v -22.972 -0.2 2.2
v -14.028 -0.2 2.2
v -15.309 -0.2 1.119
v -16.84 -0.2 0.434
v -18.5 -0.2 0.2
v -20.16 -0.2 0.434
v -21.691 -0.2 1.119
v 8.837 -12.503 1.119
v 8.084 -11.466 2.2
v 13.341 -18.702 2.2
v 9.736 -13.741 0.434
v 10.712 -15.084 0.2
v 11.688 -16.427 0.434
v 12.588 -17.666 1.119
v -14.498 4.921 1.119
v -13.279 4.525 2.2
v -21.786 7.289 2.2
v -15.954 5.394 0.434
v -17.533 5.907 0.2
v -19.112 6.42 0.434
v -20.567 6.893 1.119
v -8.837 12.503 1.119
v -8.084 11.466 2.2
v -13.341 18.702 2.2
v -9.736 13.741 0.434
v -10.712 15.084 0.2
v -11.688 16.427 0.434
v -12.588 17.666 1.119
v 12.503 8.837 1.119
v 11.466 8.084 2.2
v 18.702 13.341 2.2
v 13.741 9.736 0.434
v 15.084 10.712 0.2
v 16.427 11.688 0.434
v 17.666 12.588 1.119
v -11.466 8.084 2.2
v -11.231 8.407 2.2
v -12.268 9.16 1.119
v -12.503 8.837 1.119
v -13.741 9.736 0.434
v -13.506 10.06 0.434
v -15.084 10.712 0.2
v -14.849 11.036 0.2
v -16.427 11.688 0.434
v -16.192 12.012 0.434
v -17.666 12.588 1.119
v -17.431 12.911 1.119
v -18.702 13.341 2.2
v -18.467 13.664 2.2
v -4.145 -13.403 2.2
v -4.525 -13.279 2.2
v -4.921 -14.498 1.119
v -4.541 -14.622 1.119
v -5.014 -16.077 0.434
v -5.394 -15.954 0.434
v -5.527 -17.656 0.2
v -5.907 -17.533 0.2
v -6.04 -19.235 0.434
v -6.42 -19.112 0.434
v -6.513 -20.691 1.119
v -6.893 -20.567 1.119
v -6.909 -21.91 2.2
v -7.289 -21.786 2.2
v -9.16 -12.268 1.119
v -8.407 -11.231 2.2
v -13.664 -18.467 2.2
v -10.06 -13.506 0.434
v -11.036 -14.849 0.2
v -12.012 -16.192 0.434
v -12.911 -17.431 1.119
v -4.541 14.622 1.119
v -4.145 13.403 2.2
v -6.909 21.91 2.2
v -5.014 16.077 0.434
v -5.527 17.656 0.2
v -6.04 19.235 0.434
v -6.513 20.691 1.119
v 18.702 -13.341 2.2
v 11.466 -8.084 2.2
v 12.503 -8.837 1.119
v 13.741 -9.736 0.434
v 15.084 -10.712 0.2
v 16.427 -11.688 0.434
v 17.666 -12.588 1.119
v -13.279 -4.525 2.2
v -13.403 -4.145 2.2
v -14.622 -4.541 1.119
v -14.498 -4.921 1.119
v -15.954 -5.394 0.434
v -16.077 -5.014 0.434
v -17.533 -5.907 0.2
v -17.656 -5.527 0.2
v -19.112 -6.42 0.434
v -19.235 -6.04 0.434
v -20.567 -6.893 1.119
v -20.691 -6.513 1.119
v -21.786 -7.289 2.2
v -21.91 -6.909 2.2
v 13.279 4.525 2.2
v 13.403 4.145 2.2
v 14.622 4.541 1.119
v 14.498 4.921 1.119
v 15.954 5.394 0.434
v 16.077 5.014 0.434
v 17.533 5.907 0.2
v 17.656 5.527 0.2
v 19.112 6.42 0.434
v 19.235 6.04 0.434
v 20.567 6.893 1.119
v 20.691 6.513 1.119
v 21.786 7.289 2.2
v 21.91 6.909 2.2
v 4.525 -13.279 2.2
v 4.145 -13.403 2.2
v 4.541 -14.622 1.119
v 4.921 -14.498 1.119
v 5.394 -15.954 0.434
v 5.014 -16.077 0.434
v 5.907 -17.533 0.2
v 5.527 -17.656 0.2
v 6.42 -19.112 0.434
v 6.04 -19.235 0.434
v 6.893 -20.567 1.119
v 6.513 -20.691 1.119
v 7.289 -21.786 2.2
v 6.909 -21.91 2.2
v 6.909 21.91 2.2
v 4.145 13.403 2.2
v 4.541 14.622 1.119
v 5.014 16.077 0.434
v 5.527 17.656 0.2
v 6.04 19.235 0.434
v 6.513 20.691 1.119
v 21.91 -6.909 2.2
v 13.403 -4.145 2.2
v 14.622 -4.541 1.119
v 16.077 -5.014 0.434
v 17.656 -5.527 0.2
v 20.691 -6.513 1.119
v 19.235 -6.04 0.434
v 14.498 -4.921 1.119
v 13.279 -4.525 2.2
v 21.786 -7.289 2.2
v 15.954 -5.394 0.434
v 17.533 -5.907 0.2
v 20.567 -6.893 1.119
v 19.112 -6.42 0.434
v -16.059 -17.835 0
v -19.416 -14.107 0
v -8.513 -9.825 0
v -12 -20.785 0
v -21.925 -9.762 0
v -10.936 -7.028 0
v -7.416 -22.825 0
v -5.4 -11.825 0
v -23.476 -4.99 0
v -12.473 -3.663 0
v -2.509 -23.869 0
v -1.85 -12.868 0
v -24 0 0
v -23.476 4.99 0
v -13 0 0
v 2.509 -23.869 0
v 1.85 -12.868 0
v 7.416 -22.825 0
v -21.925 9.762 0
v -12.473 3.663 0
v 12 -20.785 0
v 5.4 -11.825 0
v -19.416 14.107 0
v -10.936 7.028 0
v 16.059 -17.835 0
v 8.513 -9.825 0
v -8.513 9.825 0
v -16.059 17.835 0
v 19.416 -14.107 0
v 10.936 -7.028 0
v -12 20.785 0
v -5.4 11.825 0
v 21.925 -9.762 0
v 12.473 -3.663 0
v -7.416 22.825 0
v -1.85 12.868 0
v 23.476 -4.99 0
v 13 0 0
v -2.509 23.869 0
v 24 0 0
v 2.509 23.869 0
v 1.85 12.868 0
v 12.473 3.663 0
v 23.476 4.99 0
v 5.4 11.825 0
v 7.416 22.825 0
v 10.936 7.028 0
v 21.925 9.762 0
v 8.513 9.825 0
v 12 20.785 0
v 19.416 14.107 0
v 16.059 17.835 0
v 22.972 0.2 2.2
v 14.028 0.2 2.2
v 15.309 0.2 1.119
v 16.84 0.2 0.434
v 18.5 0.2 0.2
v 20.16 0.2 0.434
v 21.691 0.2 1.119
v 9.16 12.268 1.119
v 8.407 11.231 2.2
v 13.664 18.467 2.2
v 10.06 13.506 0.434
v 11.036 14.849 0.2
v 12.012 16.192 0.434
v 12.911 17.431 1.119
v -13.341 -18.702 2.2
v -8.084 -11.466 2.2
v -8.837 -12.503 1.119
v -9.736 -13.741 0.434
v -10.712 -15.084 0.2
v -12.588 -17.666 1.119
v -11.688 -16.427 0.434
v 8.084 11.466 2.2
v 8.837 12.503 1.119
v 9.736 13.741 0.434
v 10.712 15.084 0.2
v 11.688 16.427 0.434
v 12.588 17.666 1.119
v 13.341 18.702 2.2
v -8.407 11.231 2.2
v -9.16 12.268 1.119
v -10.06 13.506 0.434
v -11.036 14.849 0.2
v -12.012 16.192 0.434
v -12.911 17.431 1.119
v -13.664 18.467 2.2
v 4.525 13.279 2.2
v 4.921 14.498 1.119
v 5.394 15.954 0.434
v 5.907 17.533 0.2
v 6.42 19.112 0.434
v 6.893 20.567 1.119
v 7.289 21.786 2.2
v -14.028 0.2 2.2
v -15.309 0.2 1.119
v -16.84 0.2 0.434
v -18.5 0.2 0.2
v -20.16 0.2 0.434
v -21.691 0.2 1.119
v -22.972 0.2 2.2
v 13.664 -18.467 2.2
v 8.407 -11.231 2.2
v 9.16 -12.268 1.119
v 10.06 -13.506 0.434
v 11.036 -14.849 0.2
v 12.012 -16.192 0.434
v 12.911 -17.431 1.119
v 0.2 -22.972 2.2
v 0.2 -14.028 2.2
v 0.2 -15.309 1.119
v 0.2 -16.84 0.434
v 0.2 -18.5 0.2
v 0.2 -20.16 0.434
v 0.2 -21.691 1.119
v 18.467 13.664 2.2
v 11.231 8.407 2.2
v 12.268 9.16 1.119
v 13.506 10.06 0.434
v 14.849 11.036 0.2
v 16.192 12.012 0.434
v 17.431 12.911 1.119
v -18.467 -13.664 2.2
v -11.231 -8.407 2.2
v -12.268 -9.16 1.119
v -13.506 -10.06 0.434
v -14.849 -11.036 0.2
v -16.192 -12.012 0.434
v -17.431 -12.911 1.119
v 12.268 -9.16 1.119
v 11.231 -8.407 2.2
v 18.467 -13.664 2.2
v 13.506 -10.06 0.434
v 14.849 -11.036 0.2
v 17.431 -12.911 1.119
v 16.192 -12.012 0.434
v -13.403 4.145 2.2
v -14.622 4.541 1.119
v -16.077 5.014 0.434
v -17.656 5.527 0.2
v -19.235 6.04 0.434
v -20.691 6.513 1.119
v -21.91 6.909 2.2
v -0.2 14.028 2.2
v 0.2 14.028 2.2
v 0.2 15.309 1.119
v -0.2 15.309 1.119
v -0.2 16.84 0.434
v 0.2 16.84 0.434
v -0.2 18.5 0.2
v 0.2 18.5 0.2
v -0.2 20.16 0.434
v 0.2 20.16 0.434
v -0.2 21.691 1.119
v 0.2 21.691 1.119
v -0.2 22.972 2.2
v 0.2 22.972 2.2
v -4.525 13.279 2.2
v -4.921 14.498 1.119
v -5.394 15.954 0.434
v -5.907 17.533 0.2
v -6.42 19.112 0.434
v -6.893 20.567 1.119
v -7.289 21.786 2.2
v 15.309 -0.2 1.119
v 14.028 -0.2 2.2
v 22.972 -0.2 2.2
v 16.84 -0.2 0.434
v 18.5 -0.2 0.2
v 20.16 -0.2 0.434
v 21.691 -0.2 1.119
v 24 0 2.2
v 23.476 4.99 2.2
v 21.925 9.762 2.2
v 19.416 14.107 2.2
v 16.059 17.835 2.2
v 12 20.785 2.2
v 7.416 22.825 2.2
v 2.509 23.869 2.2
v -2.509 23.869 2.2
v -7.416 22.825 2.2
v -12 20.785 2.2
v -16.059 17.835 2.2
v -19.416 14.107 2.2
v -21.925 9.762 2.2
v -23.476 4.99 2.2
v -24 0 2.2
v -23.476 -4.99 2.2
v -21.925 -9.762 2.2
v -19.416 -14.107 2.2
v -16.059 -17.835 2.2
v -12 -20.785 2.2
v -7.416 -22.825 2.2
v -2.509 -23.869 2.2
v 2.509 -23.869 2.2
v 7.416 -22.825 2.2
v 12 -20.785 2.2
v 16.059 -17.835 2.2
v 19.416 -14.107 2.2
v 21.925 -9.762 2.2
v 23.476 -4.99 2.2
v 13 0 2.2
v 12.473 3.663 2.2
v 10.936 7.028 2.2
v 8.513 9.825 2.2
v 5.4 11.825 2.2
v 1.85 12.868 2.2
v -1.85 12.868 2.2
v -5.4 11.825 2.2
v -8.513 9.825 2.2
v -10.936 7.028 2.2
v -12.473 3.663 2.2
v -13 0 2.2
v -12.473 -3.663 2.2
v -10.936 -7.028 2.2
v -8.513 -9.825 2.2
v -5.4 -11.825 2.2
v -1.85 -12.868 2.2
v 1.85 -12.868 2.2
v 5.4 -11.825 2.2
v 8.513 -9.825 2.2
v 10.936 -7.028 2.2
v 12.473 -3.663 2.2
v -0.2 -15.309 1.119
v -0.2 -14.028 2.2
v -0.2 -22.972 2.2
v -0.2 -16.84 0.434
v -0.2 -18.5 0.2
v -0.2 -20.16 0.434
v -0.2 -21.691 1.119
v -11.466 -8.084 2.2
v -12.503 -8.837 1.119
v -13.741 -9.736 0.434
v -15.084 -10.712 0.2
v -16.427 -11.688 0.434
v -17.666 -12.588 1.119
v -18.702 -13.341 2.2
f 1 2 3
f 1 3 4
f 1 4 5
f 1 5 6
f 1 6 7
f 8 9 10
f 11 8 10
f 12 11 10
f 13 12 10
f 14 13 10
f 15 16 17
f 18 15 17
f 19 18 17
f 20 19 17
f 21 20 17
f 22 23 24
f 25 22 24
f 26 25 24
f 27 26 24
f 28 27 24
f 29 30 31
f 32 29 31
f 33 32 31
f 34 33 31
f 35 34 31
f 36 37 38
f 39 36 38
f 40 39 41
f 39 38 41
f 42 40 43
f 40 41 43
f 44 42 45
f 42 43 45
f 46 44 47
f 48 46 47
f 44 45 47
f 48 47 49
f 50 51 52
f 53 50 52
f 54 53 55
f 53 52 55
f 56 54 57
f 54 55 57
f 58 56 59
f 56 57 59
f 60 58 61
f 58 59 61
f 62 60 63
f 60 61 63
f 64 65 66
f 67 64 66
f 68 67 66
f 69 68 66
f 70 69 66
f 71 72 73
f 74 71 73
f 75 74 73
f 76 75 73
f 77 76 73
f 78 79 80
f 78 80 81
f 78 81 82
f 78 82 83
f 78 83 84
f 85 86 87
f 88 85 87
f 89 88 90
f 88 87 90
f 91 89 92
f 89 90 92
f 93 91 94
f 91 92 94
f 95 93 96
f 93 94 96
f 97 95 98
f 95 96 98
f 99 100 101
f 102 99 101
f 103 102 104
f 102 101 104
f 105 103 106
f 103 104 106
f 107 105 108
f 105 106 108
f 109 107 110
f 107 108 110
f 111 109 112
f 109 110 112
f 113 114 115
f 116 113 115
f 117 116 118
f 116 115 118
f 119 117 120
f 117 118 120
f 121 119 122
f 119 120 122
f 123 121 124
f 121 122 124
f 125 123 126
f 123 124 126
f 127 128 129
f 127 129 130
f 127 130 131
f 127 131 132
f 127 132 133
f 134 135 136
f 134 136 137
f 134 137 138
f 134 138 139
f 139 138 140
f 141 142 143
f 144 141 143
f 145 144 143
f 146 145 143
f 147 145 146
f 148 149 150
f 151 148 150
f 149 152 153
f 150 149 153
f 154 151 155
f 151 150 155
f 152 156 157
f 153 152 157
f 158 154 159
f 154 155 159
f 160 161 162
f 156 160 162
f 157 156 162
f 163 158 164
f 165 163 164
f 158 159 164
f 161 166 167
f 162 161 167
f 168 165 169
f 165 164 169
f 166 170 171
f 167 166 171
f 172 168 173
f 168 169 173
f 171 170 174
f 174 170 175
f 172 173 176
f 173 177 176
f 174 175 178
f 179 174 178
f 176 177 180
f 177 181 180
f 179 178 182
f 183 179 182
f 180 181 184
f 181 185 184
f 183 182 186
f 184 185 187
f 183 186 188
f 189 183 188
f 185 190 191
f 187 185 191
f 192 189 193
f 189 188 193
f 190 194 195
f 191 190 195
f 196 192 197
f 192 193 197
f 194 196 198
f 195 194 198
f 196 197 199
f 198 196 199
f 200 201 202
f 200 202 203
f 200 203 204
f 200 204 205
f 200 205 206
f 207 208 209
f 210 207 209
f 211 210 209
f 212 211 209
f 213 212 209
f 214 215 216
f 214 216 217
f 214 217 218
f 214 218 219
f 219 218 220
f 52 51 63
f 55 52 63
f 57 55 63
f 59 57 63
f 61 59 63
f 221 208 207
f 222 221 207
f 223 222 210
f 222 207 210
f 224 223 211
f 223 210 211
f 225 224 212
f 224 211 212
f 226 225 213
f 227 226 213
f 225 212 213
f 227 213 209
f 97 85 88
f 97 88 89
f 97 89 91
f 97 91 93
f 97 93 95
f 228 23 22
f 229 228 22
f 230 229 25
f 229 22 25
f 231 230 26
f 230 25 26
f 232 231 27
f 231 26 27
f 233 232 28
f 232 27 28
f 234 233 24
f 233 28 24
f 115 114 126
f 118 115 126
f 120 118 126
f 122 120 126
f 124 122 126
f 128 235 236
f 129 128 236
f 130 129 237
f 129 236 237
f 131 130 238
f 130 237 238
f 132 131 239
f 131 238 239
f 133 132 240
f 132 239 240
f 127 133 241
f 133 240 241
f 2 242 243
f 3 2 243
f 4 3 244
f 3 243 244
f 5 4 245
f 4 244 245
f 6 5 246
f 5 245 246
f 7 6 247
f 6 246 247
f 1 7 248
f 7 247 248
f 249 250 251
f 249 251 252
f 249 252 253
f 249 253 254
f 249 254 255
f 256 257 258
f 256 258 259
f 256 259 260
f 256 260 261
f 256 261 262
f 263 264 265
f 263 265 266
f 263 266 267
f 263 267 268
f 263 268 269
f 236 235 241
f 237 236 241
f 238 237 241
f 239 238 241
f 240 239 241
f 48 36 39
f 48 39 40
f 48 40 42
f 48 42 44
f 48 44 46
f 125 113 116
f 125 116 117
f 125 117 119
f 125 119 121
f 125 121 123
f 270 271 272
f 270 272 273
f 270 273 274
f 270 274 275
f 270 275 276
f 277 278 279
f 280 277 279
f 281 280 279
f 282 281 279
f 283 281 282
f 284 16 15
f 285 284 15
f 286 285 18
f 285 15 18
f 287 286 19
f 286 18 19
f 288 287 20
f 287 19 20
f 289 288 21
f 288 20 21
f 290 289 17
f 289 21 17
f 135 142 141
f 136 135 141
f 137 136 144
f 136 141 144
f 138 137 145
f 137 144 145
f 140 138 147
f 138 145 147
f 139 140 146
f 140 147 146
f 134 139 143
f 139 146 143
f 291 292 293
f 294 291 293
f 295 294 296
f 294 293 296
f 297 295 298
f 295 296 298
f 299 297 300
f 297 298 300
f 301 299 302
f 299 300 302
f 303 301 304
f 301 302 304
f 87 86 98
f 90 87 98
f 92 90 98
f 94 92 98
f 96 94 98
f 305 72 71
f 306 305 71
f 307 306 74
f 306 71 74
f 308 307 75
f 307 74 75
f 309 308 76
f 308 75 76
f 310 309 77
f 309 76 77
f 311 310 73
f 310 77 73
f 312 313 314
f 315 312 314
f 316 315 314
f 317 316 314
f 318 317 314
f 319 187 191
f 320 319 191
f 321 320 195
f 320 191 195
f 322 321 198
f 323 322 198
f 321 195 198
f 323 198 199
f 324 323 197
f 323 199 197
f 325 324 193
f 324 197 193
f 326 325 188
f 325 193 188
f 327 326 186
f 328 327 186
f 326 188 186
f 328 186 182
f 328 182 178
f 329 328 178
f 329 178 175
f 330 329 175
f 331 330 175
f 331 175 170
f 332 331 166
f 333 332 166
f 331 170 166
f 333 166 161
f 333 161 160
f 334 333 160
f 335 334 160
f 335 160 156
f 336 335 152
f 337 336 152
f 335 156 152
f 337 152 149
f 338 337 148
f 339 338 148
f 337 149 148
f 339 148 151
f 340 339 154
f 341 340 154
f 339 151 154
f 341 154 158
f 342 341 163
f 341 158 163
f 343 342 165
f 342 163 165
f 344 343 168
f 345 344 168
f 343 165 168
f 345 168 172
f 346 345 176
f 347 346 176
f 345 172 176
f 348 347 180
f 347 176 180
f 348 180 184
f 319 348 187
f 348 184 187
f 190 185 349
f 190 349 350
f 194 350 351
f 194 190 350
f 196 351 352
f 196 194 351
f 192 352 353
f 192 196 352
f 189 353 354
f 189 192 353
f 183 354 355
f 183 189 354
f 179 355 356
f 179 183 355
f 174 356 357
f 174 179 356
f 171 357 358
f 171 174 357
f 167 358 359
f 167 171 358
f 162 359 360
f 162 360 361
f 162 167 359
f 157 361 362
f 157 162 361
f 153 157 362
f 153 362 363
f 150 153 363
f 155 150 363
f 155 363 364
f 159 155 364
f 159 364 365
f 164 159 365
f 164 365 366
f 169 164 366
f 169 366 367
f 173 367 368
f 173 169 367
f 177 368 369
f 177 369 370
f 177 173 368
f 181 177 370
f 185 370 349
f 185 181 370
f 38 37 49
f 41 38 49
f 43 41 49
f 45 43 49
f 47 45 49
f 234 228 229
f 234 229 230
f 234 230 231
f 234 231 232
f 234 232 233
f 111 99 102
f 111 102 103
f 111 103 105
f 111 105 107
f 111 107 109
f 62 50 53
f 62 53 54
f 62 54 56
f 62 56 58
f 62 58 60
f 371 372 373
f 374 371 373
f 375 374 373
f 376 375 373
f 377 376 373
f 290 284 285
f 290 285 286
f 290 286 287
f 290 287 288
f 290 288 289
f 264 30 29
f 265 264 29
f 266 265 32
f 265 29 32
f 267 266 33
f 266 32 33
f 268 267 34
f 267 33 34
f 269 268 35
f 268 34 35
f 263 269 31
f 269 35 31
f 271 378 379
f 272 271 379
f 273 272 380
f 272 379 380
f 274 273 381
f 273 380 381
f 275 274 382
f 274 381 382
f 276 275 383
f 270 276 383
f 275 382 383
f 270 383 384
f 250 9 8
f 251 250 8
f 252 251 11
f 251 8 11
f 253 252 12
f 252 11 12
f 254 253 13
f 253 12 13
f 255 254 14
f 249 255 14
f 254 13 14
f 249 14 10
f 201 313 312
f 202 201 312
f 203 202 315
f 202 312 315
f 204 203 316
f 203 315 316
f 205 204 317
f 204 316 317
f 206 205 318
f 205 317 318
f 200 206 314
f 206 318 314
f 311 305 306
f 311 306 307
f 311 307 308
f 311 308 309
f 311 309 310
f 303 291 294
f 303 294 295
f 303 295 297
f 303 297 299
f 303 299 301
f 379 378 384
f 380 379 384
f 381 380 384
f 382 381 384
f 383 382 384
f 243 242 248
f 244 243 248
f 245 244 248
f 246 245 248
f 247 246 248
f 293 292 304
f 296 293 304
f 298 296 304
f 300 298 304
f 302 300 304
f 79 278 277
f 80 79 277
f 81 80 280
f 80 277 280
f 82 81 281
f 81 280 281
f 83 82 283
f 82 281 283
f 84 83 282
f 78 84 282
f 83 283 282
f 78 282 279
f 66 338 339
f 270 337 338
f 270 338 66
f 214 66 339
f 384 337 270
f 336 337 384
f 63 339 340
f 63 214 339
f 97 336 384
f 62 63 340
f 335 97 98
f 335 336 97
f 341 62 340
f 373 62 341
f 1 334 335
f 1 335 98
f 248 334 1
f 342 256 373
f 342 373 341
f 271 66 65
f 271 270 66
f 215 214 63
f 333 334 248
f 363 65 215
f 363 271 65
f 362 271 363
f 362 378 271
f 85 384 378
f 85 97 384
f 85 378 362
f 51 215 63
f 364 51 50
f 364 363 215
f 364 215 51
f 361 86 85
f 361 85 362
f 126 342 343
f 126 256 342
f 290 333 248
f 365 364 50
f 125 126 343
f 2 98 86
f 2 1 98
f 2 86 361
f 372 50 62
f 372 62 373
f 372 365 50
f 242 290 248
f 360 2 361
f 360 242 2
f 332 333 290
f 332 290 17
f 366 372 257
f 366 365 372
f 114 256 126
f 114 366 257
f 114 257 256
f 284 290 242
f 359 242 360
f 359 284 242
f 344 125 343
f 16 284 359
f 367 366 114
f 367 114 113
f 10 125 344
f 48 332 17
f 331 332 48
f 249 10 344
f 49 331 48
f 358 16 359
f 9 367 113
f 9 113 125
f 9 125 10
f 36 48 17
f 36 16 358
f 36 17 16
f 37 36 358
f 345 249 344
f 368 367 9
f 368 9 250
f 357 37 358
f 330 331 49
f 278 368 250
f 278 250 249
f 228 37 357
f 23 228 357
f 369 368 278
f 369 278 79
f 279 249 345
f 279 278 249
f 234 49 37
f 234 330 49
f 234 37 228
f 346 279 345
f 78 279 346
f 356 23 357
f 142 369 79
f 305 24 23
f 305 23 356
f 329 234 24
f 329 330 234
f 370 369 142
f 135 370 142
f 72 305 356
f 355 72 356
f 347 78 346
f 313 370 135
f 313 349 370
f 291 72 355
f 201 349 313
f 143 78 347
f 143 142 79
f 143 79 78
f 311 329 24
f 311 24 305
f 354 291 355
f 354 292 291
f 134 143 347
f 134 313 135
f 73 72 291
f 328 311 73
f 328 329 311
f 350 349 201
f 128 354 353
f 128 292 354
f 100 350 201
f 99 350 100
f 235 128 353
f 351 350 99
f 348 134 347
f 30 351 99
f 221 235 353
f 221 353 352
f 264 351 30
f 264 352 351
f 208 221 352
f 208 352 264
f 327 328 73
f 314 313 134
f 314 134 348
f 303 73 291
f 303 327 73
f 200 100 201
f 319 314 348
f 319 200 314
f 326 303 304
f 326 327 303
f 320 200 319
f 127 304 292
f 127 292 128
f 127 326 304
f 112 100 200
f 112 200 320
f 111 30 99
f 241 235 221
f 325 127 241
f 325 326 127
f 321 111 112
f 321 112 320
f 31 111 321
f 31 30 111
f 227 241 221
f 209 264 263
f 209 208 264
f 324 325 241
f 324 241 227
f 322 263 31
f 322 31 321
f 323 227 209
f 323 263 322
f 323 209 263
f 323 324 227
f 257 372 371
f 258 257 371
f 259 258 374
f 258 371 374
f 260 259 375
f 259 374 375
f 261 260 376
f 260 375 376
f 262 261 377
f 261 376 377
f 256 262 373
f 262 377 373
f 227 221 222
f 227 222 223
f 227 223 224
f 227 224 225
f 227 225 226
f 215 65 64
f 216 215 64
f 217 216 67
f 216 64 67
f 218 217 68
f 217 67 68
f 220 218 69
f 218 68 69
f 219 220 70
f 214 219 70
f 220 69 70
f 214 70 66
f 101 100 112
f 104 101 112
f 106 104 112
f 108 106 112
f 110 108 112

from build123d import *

# Parameters (mm, degrees)
F0_R     = 24
F0_R_2   = 13
F1_DEPTH = 2.2
F2_R     = 6
F3_DEPTH = 0.2
F4_COUNT = 20


with BuildPart() as f1:
    # F0 (on Top) → F1 (new body)
    with BuildSketch(Plane.XY):
        Circle(F0_R)
        Circle(F0_R_2, mode=Mode.SUBTRACT)
    extrude(amount=F1_DEPTH)


with BuildPart() as f3:
    # F2 (on Front) → F3 (new body, symmetric)
    with BuildSketch(Plane.XZ):
        with Locations((18.5, 6.2)):
            Circle(F2_R)
    extrude(amount=F3_DEPTH, both=True)


with BuildPart() as f4_1:
    # F4: instance of F3
    add(f3.part.rotate(Axis((0, 0, 3.1), (0, 0, 1)), 1 * 360 / F4_COUNT))


with BuildPart() as f4_2:
    # F4: instance of F3
    add(f3.part.rotate(Axis((0, 0, 3.1), (0, 0, 1)), 2 * 360 / F4_COUNT))


with BuildPart() as f4_3:
    # F4: instance of F3
    add(f3.part.rotate(Axis((0, 0, 3.1), (0, 0, 1)), 3 * 360 / F4_COUNT))


with BuildPart() as f4_4:
    # F4: instance of F3
    add(f3.part.rotate(Axis((0, 0, 3.1), (0, 0, 1)), 4 * 360 / F4_COUNT))


with BuildPart() as f4_5:
    # F4: instance of F3
    add(f3.part.rotate(Axis((0, 0, 3.1), (0, 0, 1)), 5 * 360 / F4_COUNT))


with BuildPart() as f4_6:
    # F4: instance of F3
    add(f3.part.rotate(Axis((0, 0, 3.1), (0, 0, 1)), 6 * 360 / F4_COUNT))


with BuildPart() as f4_7:
    # F4: instance of F3
    add(f3.part.rotate(Axis((0, 0, 3.1), (0, 0, 1)), 7 * 360 / F4_COUNT))


with BuildPart() as f4_8:
    # F4: instance of F3
    add(f3.part.rotate(Axis((0, 0, 3.1), (0, 0, 1)), 8 * 360 / F4_COUNT))


with BuildPart() as f4_9:
    # F4: instance of F3
    add(f3.part.rotate(Axis((0, 0, 3.1), (0, 0, 1)), 9 * 360 / F4_COUNT))


with BuildPart() as f4_10:
    # F4: instance of F3
    add(f3.part.rotate(Axis((0, 0, 3.1), (0, 0, 1)), 10 * 360 / F4_COUNT))


with BuildPart() as f4_11:
    # F4: instance of F3
    add(f3.part.rotate(Axis((0, 0, 3.1), (0, 0, 1)), 11 * 360 / F4_COUNT))


with BuildPart() as f4_12:
    # F4: instance of F3
    add(f3.part.rotate(Axis((0, 0, 3.1), (0, 0, 1)), 12 * 360 / F4_COUNT))


with BuildPart() as f4_13:
    # F4: instance of F3
    add(f3.part.rotate(Axis((0, 0, 3.1), (0, 0, 1)), 13 * 360 / F4_COUNT))


with BuildPart() as f4_14:
    # F4: instance of F3
    add(f3.part.rotate(Axis((0, 0, 3.1), (0, 0, 1)), 14 * 360 / F4_COUNT))


with BuildPart() as f4_15:
    # F4: instance of F3
    add(f3.part.rotate(Axis((0, 0, 3.1), (0, 0, 1)), 15 * 360 / F4_COUNT))


with BuildPart() as f4_16:
    # F4: instance of F3
    add(f3.part.rotate(Axis((0, 0, 3.1), (0, 0, 1)), 16 * 360 / F4_COUNT))


with BuildPart() as f4_17:
    # F4: instance of F3
    add(f3.part.rotate(Axis((0, 0, 3.1), (0, 0, 1)), 17 * 360 / F4_COUNT))


with BuildPart() as f4_18:
    # F4: instance of F3
    add(f3.part.rotate(Axis((0, 0, 3.1), (0, 0, 1)), 18 * 360 / F4_COUNT))


with BuildPart() as f4_19:
    # F4: instance of F3
    add(f3.part.rotate(Axis((0, 0, 3.1), (0, 0, 1)), 19 * 360 / F4_COUNT))


with BuildPart() as f1_1:
    add(f1.part)

    # F5: cut F3, F4_18, F4_16, F4_15, F4_17, F4_19, F4_13, F4_11, F4_8, F4_12, F4_14, F4_9, F4_10, F4_7, F4_5, F4_3, F4_4, F4_2, F4_1, F4_6
    add(f3.part, mode=Mode.SUBTRACT)
    add(f4_18.part, mode=Mode.SUBTRACT)
    add(f4_16.part, mode=Mode.SUBTRACT)
    add(f4_15.part, mode=Mode.SUBTRACT)
    add(f4_17.part, mode=Mode.SUBTRACT)
    add(f4_19.part, mode=Mode.SUBTRACT)
    add(f4_13.part, mode=Mode.SUBTRACT)
    add(f4_11.part, mode=Mode.SUBTRACT)
    add(f4_8.part, mode=Mode.SUBTRACT)
    add(f4_12.part, mode=Mode.SUBTRACT)
    add(f4_14.part, mode=Mode.SUBTRACT)
    add(f4_9.part, mode=Mode.SUBTRACT)
    add(f4_10.part, mode=Mode.SUBTRACT)
    add(f4_7.part, mode=Mode.SUBTRACT)
    add(f4_5.part, mode=Mode.SUBTRACT)
    add(f4_3.part, mode=Mode.SUBTRACT)
    add(f4_4.part, mode=Mode.SUBTRACT)
    add(f4_2.part, mode=Mode.SUBTRACT)
    add(f4_1.part, mode=Mode.SUBTRACT)
    add(f4_6.part, mode=Mode.SUBTRACT)


solid = f1_1.part
